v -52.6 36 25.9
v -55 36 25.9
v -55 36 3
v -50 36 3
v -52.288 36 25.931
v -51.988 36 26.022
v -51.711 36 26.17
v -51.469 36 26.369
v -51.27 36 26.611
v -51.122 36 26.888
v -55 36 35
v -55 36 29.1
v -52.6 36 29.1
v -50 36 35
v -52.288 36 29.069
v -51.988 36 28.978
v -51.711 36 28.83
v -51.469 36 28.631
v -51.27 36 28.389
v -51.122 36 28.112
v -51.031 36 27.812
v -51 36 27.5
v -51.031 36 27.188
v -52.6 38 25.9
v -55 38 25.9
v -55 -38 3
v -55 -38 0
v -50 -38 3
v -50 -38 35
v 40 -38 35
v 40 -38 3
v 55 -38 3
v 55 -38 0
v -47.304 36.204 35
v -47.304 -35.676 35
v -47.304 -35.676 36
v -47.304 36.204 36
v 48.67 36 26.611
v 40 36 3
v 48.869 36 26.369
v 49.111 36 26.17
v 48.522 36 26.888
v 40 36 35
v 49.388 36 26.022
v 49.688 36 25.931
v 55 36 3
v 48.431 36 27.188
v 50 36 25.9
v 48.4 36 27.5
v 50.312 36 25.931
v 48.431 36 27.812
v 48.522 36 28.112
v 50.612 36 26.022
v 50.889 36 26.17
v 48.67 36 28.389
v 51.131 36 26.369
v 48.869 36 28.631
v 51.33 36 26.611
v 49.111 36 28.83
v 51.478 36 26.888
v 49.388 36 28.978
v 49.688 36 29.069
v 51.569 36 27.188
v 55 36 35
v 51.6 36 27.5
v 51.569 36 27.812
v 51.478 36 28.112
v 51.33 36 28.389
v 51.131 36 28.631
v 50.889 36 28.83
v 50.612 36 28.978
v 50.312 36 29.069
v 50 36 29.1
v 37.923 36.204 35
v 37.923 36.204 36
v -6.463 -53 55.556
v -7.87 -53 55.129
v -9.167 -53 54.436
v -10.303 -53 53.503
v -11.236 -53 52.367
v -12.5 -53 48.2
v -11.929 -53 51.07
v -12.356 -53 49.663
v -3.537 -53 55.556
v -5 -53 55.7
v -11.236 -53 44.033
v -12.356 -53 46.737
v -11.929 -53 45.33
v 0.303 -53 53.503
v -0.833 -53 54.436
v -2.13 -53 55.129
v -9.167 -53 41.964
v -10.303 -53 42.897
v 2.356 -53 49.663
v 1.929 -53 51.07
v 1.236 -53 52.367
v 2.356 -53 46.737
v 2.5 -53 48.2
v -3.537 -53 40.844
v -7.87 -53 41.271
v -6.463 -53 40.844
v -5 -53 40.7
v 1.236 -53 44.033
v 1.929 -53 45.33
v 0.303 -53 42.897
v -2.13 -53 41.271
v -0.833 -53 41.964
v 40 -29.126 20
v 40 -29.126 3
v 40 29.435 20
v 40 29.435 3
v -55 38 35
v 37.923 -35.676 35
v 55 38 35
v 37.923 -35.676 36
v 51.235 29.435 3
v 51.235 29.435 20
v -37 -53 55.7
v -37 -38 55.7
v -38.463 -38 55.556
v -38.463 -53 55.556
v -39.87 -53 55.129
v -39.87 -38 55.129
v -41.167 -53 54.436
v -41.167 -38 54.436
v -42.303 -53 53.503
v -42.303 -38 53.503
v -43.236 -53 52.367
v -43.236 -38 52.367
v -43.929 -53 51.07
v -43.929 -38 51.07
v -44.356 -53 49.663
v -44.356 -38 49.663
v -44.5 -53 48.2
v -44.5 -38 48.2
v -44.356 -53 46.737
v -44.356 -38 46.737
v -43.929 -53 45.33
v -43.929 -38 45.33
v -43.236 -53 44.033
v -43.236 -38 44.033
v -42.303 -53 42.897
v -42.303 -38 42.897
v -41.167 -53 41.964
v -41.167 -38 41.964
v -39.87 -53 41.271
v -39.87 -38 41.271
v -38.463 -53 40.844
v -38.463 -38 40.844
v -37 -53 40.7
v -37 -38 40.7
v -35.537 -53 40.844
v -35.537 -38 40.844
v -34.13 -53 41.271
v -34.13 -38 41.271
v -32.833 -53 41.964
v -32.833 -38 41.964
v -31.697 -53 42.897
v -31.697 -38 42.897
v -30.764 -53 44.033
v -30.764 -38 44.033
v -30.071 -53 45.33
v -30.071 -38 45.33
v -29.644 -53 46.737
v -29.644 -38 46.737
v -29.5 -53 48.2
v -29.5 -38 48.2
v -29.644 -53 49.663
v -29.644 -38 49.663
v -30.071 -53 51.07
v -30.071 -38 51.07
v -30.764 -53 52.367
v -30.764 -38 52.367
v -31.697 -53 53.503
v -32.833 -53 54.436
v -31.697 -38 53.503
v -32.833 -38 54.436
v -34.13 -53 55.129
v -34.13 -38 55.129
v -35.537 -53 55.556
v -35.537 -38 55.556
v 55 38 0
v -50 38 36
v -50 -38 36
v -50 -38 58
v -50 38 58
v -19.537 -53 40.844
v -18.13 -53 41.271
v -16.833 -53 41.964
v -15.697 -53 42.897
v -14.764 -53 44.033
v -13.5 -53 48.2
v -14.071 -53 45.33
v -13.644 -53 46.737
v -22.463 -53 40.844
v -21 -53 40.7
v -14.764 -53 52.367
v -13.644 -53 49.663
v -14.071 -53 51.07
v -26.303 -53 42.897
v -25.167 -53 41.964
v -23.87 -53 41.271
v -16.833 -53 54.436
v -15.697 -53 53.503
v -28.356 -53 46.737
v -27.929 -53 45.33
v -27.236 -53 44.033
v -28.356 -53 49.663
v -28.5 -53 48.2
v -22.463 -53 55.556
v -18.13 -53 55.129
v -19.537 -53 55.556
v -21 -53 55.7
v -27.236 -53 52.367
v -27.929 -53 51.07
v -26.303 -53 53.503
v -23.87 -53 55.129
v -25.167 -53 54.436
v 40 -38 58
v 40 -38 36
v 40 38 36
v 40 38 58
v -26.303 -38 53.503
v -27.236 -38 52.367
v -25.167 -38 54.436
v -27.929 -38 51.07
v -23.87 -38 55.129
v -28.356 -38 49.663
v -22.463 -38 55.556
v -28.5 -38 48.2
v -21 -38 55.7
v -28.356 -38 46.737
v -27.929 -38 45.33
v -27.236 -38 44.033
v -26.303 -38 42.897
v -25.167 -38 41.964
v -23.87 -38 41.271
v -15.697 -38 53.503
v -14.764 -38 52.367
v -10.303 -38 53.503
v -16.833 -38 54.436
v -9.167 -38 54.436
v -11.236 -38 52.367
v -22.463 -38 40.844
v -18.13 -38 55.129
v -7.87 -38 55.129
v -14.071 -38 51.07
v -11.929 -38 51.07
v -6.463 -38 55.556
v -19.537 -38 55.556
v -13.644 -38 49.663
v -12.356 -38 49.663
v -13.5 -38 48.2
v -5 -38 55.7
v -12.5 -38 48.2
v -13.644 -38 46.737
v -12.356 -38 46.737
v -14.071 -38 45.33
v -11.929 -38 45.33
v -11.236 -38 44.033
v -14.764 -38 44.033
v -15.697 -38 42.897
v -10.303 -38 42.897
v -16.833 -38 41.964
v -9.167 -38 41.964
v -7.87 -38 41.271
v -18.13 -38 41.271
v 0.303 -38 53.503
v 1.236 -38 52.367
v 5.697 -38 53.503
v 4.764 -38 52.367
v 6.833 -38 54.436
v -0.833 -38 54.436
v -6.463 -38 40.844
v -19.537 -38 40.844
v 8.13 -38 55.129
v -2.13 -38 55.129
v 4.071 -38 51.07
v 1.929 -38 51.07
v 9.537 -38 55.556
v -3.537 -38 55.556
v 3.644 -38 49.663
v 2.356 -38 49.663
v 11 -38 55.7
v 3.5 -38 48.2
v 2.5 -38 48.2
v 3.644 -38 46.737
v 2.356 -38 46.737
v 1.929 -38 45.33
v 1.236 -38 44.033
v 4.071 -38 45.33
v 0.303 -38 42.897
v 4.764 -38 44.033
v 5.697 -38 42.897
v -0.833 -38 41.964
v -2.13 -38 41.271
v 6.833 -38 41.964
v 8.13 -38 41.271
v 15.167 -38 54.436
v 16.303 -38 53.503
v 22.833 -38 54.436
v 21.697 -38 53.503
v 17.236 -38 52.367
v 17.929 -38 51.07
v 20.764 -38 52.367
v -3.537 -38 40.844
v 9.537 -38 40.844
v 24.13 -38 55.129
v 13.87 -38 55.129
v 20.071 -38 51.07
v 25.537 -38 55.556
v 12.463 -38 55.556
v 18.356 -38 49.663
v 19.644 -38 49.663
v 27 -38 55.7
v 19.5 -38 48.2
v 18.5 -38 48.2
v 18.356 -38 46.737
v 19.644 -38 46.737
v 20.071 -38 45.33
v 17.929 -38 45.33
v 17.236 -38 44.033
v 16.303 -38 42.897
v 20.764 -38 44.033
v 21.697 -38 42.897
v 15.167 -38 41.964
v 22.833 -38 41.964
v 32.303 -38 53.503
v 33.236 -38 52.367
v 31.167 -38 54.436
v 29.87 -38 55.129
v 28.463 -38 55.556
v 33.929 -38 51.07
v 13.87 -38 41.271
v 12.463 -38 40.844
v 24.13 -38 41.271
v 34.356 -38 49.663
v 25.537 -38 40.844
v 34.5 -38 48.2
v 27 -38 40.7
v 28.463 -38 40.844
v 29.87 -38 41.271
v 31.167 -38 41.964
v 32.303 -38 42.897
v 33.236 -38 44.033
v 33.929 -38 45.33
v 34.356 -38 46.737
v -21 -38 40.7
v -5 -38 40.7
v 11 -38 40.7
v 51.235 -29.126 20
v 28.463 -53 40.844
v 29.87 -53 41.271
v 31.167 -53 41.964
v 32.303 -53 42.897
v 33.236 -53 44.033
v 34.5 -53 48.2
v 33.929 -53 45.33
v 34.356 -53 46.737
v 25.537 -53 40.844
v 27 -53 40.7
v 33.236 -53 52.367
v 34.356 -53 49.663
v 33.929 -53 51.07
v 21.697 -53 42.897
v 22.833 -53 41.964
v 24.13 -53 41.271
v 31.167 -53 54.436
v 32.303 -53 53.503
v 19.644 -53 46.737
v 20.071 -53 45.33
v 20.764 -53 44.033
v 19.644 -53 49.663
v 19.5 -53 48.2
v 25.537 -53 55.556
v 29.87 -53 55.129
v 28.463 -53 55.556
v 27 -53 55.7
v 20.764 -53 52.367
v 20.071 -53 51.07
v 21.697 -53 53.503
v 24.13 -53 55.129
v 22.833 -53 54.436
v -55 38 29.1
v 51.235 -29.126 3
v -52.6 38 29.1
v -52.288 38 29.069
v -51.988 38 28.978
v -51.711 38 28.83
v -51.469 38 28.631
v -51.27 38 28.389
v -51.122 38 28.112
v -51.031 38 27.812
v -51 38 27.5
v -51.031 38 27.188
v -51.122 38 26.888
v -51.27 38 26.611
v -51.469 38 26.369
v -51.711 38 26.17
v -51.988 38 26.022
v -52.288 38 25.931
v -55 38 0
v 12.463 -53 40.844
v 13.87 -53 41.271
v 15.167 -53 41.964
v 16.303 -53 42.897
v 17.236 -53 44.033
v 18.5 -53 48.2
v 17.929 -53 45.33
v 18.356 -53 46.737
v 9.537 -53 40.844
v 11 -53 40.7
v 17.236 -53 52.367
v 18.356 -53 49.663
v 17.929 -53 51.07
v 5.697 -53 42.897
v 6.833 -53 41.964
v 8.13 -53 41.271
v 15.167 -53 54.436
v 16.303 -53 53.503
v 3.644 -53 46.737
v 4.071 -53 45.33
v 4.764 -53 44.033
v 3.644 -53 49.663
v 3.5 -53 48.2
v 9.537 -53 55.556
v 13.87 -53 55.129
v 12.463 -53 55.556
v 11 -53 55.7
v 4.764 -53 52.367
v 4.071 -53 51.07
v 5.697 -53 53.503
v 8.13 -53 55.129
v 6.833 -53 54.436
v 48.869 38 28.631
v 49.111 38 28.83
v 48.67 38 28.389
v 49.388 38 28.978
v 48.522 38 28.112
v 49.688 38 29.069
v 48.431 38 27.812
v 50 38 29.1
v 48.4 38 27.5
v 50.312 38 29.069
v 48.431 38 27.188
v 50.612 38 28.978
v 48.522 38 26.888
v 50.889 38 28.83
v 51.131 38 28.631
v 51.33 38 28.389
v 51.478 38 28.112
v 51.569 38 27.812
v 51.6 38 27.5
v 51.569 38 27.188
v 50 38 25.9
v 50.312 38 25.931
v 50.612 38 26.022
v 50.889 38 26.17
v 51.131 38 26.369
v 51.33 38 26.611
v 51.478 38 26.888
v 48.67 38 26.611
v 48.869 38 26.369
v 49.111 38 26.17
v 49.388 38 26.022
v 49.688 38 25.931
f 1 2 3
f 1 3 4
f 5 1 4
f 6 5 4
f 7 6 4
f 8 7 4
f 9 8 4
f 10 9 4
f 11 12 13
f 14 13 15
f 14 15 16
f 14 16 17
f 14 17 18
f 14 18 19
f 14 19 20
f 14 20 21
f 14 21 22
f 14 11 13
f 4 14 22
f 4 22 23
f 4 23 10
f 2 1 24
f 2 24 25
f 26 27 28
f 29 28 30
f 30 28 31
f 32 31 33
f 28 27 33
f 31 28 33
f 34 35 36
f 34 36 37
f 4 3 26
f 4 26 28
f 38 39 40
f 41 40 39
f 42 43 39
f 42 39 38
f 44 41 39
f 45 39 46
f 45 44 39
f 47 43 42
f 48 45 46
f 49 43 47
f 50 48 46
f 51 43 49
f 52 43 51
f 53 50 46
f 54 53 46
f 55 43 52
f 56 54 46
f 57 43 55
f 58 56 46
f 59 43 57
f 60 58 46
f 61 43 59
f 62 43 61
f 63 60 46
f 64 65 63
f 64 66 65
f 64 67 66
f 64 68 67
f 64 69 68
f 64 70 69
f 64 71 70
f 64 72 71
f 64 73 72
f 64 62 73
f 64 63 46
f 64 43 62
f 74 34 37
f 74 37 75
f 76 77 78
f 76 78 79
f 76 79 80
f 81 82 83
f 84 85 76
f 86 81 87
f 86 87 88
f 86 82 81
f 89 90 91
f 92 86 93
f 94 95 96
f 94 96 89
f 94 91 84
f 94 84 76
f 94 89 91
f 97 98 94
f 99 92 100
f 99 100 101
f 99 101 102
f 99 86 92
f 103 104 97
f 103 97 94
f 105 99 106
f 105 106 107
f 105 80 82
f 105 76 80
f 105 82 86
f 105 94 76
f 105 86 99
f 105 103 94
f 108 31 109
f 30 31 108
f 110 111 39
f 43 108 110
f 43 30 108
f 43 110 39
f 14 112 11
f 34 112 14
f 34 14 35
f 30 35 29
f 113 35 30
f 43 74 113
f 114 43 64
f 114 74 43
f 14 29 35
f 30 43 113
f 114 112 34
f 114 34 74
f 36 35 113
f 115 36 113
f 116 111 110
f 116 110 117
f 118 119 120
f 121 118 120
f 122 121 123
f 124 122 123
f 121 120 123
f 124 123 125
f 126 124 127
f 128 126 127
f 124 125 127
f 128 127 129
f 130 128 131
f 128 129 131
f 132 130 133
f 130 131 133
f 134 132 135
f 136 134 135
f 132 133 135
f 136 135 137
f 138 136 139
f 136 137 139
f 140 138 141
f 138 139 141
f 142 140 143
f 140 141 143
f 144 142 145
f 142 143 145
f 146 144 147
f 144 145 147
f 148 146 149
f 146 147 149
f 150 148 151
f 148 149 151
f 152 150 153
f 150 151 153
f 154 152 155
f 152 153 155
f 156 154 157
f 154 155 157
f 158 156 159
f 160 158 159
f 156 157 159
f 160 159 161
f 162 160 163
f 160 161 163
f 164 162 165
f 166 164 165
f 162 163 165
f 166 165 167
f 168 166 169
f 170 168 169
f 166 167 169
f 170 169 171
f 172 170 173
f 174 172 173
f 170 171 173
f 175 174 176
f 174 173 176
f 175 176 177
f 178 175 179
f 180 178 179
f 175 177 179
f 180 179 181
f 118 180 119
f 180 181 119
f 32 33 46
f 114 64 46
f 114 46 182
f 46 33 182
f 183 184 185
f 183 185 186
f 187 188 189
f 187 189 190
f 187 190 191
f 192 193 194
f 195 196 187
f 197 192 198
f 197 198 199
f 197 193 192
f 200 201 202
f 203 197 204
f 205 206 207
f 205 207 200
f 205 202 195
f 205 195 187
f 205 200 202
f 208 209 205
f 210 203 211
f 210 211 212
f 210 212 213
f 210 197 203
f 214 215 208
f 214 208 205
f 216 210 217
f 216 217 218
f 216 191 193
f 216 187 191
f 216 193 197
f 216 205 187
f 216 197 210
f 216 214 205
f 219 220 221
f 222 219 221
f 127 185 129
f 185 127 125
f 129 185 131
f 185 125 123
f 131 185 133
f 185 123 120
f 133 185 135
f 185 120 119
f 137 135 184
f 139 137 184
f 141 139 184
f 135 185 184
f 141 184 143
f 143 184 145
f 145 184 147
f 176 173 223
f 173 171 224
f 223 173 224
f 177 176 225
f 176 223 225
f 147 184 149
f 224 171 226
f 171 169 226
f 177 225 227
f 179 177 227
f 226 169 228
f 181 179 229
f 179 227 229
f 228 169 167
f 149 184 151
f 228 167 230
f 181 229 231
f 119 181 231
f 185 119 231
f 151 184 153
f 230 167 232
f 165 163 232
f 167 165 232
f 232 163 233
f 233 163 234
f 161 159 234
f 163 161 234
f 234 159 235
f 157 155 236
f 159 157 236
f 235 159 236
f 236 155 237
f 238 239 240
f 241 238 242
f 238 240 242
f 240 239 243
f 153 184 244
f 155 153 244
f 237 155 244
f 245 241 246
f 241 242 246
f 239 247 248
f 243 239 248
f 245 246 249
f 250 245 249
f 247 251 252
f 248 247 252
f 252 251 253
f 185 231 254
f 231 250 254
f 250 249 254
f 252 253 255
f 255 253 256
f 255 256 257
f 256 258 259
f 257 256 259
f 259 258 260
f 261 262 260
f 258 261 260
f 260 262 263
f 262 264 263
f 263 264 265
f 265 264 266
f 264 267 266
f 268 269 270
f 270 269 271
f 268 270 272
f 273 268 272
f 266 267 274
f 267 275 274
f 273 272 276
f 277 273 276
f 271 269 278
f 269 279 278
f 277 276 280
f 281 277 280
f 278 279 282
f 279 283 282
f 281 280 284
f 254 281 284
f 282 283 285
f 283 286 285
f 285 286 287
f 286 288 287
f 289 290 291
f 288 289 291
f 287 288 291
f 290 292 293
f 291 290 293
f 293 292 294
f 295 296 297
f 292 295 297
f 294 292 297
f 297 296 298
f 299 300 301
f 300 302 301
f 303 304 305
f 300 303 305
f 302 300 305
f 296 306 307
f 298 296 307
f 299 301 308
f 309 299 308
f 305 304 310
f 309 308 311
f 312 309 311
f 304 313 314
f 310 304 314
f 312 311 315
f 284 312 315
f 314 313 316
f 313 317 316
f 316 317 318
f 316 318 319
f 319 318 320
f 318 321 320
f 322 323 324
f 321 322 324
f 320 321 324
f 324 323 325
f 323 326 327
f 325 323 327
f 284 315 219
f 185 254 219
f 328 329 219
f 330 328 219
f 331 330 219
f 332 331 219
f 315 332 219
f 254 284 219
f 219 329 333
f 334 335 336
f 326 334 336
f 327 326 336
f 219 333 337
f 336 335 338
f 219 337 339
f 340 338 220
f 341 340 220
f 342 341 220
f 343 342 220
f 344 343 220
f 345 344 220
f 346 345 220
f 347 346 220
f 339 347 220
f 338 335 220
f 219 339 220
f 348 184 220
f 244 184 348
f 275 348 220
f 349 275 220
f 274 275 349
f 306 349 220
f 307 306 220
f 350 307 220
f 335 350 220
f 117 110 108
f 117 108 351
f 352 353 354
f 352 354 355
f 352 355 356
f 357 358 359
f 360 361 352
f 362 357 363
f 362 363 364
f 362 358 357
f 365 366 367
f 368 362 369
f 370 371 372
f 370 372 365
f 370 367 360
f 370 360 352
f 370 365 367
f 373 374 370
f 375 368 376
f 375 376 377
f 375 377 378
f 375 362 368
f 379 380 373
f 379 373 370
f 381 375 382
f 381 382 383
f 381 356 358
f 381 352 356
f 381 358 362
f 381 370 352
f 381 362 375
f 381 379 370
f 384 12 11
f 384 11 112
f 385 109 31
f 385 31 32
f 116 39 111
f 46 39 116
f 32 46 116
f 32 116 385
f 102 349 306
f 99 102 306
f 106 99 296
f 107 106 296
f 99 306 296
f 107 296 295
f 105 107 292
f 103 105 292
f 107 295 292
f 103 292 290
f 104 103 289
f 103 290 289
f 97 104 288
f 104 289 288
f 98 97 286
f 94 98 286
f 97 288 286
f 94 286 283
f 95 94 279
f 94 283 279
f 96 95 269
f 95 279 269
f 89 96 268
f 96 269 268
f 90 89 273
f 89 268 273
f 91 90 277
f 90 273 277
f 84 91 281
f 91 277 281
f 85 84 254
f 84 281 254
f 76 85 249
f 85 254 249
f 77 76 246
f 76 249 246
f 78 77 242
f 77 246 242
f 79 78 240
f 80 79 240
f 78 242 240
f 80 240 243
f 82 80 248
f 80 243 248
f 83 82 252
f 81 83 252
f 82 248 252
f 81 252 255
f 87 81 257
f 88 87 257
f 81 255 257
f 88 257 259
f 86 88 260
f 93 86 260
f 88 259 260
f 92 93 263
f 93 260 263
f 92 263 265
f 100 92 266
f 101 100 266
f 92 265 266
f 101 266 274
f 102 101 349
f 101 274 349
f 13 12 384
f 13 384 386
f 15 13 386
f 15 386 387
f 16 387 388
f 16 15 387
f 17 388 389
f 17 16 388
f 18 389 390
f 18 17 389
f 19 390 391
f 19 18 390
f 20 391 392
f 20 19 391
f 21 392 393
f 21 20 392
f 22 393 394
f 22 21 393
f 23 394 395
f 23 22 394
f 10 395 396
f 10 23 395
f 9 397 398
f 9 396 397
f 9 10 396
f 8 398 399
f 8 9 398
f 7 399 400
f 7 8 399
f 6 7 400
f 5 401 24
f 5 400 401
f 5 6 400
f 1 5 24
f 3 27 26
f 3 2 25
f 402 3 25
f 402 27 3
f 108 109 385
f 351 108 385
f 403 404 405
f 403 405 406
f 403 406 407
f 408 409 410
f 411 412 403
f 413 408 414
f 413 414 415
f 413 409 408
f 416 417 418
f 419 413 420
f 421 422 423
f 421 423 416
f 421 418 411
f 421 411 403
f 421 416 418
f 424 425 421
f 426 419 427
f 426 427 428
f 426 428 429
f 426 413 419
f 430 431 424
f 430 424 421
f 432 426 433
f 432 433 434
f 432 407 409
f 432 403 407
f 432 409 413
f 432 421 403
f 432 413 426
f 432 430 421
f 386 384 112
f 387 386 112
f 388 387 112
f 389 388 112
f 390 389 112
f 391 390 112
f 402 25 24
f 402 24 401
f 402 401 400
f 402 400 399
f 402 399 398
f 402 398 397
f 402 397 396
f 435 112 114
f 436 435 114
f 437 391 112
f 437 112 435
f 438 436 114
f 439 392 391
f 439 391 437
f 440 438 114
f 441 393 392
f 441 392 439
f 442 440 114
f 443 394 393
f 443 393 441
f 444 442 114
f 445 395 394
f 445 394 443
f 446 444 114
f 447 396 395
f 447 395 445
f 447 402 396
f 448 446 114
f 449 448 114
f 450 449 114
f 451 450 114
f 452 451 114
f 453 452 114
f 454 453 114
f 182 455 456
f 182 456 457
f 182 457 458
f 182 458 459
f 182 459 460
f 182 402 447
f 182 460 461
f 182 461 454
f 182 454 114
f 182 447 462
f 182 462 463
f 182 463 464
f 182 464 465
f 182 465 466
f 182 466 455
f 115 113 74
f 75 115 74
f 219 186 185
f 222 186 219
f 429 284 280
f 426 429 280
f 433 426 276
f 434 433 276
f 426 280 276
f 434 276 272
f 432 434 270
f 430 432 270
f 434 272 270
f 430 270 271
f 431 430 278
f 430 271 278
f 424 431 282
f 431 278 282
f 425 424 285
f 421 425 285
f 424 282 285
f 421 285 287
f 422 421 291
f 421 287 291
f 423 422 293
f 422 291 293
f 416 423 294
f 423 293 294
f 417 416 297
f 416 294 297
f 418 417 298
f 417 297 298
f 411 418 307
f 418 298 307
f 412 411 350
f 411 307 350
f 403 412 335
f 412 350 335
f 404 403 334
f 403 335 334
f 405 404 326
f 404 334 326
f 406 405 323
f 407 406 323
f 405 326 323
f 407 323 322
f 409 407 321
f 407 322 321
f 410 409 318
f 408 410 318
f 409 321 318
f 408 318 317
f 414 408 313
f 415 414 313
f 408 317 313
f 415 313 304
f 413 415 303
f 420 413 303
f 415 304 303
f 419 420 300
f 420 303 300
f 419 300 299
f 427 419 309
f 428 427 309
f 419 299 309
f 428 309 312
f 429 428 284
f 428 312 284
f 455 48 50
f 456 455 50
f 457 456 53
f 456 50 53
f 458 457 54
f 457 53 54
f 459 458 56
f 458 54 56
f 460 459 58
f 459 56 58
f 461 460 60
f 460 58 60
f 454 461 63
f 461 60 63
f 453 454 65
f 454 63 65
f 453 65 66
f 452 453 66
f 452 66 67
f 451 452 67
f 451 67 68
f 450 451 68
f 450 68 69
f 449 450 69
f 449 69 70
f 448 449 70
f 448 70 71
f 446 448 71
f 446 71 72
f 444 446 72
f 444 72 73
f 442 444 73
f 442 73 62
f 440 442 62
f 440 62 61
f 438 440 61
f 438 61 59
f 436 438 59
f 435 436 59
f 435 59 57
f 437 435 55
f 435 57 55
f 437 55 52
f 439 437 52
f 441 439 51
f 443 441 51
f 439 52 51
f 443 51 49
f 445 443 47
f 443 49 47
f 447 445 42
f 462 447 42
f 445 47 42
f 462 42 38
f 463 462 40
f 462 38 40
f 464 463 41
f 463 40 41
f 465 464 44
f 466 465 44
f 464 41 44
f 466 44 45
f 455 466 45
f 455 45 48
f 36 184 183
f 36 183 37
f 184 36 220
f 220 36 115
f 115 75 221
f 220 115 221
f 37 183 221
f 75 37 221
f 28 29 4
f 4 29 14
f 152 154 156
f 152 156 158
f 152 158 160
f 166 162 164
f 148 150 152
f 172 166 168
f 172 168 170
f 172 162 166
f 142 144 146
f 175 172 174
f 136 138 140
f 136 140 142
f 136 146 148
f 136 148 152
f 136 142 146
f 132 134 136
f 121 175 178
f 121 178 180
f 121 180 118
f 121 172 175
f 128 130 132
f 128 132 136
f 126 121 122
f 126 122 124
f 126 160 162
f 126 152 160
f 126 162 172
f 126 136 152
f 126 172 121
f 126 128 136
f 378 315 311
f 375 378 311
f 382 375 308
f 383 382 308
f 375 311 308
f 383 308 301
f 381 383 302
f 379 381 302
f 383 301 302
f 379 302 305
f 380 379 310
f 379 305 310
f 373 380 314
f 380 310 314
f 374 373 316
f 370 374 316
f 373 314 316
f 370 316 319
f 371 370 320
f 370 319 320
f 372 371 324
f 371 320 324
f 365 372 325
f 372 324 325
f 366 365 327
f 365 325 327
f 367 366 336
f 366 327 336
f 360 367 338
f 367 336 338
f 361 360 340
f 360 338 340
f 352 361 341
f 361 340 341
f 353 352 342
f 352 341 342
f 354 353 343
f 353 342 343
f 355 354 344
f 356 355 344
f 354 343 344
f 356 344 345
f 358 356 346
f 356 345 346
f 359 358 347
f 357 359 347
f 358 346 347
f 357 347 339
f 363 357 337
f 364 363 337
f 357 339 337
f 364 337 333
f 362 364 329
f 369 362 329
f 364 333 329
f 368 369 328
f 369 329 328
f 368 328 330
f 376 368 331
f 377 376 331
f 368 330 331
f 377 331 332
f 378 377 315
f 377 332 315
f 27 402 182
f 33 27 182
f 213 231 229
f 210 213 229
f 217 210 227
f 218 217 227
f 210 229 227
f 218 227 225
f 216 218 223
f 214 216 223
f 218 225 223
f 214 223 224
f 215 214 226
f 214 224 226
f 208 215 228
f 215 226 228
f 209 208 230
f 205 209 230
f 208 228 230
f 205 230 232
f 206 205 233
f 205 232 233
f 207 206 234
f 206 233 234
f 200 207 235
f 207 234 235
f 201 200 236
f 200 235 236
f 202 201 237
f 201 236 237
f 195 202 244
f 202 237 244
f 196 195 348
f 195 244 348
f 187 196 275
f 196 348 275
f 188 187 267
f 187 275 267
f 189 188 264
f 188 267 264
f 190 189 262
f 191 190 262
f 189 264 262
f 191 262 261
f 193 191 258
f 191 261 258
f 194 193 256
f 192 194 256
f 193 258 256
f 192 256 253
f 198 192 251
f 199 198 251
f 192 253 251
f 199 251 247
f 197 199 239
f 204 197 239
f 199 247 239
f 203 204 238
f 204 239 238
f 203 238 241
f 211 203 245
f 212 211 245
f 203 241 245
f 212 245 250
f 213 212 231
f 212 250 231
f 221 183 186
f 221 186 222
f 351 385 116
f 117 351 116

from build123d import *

# Parameters (mm, degrees)
SKETCH1_W           = 110
SKETCH1_H           = 76
BOSS_EXTRUDE1_DEPTH = 35
SKETCH2_W           = 15
SKETCH2_H           = 74
SKETCH2_W_2         = 5
CUT_EXTRUDE1_DEPTH  = 32
SKETCH3_W           = 11.235183257
SKETCH3_H           = 58.560748925
BOSS_EXTRUDE2_DEPTH = 17
SKETCH4_W           = 85.227436201
SKETCH4_H           = 71.879332631
BOSS_EXTRUDE3_DEPTH = 1
SKETCH5_W           = 90
SKETCH5_H           = 76
BOSS_EXTRUDE4_DEPTH = 22
SKETCH6_R           = 7.5
BOSS_EXTRUDE5_DEPTH = 15
SKETCH7_R           = 1.6
CUT_EXTRUDE2_DEPTH  = 5


with BuildPart() as part:
    # Sketch1 → Boss-Extrude1 (new body)
    with BuildSketch(Plane.XY):
        Rectangle(SKETCH1_W, SKETCH1_H)
    extrude(amount=BOSS_EXTRUDE1_DEPTH)

    # Sketch2 → Cut-Extrude1 (cut)
    with BuildSketch(Plane.XY.offset(35)):
        with Locations((47.5, -1)):
            Rectangle(SKETCH2_W, SKETCH2_H)
        with Locations((-52.5, -1)):
            Rectangle(SKETCH2_W_2, SKETCH2_H)
    extrude(amount=-CUT_EXTRUDE1_DEPTH, mode=Mode.SUBTRACT)

    # Sketch3 → Boss-Extrude2 (add)
    with BuildSketch(Plane.XY.offset(3)):
        with Locations((45.617591629, 0.154641352)):
            Rectangle(SKETCH3_W, SKETCH3_H)
    extrude(amount=BOSS_EXTRUDE2_DEPTH)

    # Sketch4 → Boss-Extrude3 (add)
    with BuildSketch(Plane.XY.offset(35)):
        with Locations((-4.69027722, 0.263838975)):
            Rectangle(SKETCH4_W, SKETCH4_H)
    extrude(amount=BOSS_EXTRUDE3_DEPTH)

    # Sketch5 → Boss-Extrude4 (add)
    with BuildSketch(Plane.XY.offset(36)):
        with Locations((-5, 0)):
            Rectangle(SKETCH5_W, SKETCH5_H)
    extrude(amount=BOSS_EXTRUDE4_DEPTH)

    # Sketch6 → Boss-Extrude5 (add)
    with BuildSketch(Plane.XZ.offset(38)):
        with Locations((-5, 48.2)):
            Circle(SKETCH6_R)
        with Locations((11, 48.2)):
            Circle(SKETCH6_R)
        with Locations((27, 48.2)):
            Circle(SKETCH6_R)
        with Locations((-21, 48.2)):
            Circle(SKETCH6_R)
        with Locations((-37, 48.2)):
            Circle(SKETCH6_R)
    extrude(amount=BOSS_EXTRUDE5_DEPTH)

    # Sketch7 → Cut-Extrude2 (cut)
    with BuildSketch(Plane.XZ.offset(-36)):
        with Locations((50, 27.5)):
            Circle(SKETCH7_R)
        with BuildLine():
            Line((-55, 29.1), (-52.6, 29.1))
            ThreePointArc((-52.6, 29.1), (-51, 27.5), (-52.6, 25.9))
            Line((-52.6, 25.9), (-55, 25.9))
            Line((-55, 25.9), (-55, 29.1))
        make_face()
    extrude(amount=-CUT_EXTRUDE2_DEPTH, mode=Mode.SUBTRACT)


solid = part.part
